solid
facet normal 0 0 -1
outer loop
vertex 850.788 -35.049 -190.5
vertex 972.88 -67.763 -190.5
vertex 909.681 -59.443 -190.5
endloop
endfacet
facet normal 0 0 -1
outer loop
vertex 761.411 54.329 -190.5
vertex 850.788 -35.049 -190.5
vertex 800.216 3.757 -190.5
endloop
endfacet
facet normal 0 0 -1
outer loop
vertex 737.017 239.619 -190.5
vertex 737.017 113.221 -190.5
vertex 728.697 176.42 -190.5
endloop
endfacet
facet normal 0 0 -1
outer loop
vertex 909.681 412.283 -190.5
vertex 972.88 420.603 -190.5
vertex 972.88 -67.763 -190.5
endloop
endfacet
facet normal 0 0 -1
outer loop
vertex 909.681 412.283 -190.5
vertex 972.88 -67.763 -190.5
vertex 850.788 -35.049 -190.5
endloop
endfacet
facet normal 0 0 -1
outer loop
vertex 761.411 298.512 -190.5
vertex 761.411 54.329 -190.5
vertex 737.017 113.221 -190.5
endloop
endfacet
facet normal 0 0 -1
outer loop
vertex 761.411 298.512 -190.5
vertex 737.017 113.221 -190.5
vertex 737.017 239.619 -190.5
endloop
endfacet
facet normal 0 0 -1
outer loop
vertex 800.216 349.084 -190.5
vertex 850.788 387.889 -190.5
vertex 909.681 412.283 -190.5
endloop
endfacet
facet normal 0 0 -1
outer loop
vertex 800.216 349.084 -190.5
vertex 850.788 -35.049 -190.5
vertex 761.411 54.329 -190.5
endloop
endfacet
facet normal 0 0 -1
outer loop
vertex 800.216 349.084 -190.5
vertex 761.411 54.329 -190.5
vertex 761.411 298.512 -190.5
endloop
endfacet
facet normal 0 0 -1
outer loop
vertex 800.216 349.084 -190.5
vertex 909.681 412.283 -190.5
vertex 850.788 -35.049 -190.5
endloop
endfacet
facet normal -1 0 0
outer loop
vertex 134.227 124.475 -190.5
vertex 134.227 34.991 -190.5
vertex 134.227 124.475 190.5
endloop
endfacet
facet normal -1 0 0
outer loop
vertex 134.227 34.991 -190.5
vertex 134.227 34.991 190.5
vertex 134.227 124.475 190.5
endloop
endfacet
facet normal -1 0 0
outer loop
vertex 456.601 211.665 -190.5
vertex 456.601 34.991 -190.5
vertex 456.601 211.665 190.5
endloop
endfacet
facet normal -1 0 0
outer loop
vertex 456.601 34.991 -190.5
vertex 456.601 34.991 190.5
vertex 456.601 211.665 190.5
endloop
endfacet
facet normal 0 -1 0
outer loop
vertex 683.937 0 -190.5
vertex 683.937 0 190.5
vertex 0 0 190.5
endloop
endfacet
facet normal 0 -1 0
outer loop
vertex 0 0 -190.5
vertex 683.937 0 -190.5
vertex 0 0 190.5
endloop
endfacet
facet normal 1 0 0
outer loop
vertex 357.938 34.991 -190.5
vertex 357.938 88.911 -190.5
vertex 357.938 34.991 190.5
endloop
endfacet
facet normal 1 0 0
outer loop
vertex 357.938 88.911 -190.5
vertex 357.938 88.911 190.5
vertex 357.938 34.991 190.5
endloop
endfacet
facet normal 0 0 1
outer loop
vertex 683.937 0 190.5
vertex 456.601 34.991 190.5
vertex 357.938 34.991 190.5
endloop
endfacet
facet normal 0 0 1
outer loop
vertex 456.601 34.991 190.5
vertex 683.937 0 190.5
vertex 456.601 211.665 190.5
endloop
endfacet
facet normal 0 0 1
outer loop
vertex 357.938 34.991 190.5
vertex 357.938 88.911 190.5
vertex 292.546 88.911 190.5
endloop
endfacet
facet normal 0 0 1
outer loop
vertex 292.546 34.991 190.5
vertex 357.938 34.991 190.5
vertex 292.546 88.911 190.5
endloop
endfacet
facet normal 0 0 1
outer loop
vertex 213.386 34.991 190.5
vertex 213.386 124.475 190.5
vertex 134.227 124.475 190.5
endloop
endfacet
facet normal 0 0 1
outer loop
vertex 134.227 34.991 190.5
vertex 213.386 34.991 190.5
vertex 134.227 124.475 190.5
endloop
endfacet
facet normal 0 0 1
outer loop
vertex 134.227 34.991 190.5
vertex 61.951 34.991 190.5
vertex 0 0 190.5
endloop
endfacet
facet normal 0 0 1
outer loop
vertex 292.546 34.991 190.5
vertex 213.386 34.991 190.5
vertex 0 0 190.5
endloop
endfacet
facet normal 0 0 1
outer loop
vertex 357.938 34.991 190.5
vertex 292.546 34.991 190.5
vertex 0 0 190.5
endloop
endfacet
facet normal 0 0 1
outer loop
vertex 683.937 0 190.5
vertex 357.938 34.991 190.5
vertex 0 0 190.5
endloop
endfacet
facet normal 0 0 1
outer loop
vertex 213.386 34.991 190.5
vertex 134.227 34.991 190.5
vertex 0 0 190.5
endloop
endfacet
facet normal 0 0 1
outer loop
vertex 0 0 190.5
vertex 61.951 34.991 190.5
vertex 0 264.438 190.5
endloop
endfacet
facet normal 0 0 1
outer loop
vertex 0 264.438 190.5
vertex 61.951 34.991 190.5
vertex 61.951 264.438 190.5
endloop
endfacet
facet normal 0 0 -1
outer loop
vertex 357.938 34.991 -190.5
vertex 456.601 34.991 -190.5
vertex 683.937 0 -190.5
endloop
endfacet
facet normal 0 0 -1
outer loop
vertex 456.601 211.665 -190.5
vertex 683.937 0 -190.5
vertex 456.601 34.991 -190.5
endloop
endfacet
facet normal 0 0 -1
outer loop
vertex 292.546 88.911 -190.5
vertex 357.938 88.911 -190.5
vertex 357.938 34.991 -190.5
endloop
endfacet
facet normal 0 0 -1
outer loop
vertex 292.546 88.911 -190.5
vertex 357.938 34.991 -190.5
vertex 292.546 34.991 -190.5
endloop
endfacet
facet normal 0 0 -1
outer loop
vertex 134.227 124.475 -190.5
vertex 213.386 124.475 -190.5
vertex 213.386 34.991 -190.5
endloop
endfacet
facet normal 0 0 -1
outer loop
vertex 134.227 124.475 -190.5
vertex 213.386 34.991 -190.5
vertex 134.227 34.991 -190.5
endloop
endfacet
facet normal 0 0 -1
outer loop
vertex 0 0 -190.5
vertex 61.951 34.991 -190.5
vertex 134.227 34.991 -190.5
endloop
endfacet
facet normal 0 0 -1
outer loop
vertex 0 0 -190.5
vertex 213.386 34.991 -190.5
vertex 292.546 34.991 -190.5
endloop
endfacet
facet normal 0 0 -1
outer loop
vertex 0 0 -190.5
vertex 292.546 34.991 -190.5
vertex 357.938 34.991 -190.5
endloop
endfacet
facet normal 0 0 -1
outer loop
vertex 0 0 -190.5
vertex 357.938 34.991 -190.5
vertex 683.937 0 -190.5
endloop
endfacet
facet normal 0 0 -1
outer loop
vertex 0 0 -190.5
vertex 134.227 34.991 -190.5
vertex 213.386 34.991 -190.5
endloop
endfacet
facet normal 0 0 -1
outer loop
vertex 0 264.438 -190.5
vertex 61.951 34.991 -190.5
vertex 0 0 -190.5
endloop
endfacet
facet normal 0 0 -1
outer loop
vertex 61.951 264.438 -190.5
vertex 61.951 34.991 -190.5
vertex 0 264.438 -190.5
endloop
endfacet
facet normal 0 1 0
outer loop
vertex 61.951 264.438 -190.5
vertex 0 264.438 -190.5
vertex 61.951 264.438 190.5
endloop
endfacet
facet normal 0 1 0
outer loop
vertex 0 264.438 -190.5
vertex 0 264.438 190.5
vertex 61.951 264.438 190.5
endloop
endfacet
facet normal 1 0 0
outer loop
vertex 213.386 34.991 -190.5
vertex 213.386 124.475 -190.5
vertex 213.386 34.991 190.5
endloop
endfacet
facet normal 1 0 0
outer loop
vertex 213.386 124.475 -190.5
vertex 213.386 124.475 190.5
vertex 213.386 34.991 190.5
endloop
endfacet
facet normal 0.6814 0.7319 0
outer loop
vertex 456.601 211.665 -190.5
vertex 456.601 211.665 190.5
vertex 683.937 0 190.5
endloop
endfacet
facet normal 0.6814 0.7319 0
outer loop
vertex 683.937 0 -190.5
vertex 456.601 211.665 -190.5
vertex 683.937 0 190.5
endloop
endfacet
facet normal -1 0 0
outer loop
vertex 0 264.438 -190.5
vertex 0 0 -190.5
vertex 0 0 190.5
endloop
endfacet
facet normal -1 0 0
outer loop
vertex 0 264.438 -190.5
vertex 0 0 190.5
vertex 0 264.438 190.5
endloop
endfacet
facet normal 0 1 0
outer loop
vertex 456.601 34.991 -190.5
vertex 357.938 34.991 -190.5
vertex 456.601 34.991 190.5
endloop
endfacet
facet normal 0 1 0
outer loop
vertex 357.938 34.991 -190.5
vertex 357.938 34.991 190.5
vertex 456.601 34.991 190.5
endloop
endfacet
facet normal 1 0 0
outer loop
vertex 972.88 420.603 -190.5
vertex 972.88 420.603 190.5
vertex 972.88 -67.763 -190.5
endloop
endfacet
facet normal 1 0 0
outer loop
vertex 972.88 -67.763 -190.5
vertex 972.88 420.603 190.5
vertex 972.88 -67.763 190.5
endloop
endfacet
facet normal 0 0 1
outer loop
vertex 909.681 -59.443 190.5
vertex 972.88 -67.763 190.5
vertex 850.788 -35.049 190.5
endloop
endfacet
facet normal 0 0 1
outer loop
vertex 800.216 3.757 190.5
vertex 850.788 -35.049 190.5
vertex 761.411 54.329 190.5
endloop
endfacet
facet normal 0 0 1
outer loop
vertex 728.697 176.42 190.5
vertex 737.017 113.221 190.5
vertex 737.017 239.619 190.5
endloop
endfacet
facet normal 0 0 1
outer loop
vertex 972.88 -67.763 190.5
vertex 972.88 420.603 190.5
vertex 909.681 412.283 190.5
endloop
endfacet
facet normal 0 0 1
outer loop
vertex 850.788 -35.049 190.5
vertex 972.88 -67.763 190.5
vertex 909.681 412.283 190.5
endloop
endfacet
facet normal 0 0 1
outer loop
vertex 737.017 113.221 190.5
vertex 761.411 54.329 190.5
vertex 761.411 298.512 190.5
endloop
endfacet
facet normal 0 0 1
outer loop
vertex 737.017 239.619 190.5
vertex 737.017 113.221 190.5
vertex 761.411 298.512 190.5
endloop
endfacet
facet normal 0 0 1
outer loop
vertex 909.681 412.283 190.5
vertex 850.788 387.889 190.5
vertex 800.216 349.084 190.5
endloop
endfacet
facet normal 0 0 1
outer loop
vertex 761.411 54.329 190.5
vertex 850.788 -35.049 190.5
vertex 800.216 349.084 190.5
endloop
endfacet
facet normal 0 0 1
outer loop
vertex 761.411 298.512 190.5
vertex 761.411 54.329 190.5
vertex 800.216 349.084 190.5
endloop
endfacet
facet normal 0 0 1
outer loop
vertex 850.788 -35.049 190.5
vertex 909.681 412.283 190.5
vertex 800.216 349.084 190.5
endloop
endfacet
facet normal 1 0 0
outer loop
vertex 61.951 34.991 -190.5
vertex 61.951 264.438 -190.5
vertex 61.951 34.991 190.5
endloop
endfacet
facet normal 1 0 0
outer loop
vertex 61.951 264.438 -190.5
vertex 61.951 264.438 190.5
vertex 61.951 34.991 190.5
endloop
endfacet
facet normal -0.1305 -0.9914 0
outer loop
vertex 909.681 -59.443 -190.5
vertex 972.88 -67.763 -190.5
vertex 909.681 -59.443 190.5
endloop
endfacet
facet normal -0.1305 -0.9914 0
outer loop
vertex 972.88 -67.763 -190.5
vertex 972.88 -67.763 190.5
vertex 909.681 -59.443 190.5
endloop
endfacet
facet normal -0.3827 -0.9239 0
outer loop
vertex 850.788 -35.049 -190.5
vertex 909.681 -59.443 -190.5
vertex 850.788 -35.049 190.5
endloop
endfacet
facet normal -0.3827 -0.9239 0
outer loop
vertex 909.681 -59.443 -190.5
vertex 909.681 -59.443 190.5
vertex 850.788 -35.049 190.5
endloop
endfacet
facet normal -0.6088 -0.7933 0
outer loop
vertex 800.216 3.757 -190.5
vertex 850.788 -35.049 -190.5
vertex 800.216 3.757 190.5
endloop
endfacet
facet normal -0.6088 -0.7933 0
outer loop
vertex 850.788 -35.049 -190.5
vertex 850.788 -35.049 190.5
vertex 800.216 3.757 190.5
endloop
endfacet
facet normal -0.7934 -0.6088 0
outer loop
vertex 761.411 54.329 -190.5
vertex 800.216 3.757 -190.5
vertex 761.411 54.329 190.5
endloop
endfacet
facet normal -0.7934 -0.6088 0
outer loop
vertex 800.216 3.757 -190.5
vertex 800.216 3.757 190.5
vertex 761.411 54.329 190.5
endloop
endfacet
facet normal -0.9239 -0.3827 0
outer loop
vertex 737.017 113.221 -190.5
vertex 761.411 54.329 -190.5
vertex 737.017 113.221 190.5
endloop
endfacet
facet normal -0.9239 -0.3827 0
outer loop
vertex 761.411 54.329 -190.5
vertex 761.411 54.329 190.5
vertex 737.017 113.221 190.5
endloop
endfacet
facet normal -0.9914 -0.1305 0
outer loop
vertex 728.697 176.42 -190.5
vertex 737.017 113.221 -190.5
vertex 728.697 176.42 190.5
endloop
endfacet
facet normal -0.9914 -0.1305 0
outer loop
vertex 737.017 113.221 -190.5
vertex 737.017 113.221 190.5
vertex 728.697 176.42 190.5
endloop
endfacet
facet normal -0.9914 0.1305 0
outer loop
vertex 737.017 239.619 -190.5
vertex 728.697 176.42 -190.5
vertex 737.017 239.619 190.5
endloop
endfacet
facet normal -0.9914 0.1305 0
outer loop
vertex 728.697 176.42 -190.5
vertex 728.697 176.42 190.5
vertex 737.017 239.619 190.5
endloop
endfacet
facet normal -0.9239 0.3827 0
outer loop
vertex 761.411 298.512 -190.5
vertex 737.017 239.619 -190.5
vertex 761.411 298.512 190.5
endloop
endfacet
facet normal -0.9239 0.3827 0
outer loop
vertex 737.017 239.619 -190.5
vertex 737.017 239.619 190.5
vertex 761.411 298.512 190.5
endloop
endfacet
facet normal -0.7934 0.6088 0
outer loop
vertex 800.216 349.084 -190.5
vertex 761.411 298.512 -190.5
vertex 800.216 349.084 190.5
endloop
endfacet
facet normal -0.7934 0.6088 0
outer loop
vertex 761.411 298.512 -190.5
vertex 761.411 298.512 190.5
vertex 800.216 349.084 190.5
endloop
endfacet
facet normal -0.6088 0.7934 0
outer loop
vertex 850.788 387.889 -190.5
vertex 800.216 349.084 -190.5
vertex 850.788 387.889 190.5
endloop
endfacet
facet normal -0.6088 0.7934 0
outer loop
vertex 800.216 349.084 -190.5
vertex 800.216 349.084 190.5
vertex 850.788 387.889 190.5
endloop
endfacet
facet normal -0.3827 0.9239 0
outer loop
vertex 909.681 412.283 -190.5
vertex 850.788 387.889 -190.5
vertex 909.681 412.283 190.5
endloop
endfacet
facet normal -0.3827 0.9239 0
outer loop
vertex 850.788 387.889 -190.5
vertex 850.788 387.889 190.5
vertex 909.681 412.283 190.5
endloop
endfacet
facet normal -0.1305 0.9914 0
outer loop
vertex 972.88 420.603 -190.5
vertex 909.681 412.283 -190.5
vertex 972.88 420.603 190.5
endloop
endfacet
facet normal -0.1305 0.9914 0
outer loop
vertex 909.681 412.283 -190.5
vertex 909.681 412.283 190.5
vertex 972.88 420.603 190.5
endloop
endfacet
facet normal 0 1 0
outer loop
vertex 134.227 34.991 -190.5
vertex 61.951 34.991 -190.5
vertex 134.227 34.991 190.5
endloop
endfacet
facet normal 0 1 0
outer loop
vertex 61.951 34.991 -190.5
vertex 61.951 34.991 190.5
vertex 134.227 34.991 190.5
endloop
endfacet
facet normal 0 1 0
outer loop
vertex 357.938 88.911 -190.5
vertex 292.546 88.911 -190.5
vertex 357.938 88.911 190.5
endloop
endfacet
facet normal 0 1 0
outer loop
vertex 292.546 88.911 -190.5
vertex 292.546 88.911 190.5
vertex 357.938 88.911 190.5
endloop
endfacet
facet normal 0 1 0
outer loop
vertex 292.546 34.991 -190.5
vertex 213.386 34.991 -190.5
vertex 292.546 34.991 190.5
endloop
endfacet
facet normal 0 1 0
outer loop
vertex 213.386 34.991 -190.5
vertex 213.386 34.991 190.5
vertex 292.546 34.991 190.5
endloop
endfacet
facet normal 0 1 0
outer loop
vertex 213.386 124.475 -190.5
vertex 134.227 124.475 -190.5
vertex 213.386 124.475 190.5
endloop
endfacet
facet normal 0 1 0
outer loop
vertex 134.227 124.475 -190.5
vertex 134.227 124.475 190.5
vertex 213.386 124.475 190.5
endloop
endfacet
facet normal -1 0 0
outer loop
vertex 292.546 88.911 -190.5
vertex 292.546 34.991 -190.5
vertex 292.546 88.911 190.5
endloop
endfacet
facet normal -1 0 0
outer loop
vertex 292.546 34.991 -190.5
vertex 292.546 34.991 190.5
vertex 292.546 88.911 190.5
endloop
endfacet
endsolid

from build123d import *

# Parameters (mm, degrees)
BOSS_EXTRUDE1_DEPTH   = 190.5
BOSS_EXTRUDE1_2_DEPTH = 190.5


with BuildPart() as part:
    # Sketch1 → Boss-Extrude1 (new, symmetric)
    with BuildSketch(Plane.XY):
        Polygon((0, 0), (0, 264.438275148), (61.950832356, 264.438275148), (61.950832356, 34.990747905), (134.226803438, 34.990747905), (134.226803438, 124.47528353), (213.386200337, 124.47528353), (213.386200337, 34.990747905), (292.545597236, 34.990747905), (292.545597236, 88.910916807), (357.9381425, 88.910916807), (357.9381425, 34.990747905), (456.600579215, 34.990747905), (456.600579215, 211.665343882), (683.937189208, 0), align=None)
    extrude(amount=BOSS_EXTRUDE1_DEPTH, both=True)


with BuildPart() as body_2:
    # Sketch1 → Boss-Extrude1 2 (new, symmetric)
    with BuildSketch(Plane.XY):
        with BuildLine():
            Line((972.879836168, 420.603130604), (972.879836168, -67.762908332))
            ThreePointArc((972.879836168, -67.762908332), (728.696816701, 176.420111136), (972.879836168, 420.603130604))
        make_face()
    extrude(amount=BOSS_EXTRUDE1_2_DEPTH, both=True)


solid = Compound([part.part, body_2.part])
